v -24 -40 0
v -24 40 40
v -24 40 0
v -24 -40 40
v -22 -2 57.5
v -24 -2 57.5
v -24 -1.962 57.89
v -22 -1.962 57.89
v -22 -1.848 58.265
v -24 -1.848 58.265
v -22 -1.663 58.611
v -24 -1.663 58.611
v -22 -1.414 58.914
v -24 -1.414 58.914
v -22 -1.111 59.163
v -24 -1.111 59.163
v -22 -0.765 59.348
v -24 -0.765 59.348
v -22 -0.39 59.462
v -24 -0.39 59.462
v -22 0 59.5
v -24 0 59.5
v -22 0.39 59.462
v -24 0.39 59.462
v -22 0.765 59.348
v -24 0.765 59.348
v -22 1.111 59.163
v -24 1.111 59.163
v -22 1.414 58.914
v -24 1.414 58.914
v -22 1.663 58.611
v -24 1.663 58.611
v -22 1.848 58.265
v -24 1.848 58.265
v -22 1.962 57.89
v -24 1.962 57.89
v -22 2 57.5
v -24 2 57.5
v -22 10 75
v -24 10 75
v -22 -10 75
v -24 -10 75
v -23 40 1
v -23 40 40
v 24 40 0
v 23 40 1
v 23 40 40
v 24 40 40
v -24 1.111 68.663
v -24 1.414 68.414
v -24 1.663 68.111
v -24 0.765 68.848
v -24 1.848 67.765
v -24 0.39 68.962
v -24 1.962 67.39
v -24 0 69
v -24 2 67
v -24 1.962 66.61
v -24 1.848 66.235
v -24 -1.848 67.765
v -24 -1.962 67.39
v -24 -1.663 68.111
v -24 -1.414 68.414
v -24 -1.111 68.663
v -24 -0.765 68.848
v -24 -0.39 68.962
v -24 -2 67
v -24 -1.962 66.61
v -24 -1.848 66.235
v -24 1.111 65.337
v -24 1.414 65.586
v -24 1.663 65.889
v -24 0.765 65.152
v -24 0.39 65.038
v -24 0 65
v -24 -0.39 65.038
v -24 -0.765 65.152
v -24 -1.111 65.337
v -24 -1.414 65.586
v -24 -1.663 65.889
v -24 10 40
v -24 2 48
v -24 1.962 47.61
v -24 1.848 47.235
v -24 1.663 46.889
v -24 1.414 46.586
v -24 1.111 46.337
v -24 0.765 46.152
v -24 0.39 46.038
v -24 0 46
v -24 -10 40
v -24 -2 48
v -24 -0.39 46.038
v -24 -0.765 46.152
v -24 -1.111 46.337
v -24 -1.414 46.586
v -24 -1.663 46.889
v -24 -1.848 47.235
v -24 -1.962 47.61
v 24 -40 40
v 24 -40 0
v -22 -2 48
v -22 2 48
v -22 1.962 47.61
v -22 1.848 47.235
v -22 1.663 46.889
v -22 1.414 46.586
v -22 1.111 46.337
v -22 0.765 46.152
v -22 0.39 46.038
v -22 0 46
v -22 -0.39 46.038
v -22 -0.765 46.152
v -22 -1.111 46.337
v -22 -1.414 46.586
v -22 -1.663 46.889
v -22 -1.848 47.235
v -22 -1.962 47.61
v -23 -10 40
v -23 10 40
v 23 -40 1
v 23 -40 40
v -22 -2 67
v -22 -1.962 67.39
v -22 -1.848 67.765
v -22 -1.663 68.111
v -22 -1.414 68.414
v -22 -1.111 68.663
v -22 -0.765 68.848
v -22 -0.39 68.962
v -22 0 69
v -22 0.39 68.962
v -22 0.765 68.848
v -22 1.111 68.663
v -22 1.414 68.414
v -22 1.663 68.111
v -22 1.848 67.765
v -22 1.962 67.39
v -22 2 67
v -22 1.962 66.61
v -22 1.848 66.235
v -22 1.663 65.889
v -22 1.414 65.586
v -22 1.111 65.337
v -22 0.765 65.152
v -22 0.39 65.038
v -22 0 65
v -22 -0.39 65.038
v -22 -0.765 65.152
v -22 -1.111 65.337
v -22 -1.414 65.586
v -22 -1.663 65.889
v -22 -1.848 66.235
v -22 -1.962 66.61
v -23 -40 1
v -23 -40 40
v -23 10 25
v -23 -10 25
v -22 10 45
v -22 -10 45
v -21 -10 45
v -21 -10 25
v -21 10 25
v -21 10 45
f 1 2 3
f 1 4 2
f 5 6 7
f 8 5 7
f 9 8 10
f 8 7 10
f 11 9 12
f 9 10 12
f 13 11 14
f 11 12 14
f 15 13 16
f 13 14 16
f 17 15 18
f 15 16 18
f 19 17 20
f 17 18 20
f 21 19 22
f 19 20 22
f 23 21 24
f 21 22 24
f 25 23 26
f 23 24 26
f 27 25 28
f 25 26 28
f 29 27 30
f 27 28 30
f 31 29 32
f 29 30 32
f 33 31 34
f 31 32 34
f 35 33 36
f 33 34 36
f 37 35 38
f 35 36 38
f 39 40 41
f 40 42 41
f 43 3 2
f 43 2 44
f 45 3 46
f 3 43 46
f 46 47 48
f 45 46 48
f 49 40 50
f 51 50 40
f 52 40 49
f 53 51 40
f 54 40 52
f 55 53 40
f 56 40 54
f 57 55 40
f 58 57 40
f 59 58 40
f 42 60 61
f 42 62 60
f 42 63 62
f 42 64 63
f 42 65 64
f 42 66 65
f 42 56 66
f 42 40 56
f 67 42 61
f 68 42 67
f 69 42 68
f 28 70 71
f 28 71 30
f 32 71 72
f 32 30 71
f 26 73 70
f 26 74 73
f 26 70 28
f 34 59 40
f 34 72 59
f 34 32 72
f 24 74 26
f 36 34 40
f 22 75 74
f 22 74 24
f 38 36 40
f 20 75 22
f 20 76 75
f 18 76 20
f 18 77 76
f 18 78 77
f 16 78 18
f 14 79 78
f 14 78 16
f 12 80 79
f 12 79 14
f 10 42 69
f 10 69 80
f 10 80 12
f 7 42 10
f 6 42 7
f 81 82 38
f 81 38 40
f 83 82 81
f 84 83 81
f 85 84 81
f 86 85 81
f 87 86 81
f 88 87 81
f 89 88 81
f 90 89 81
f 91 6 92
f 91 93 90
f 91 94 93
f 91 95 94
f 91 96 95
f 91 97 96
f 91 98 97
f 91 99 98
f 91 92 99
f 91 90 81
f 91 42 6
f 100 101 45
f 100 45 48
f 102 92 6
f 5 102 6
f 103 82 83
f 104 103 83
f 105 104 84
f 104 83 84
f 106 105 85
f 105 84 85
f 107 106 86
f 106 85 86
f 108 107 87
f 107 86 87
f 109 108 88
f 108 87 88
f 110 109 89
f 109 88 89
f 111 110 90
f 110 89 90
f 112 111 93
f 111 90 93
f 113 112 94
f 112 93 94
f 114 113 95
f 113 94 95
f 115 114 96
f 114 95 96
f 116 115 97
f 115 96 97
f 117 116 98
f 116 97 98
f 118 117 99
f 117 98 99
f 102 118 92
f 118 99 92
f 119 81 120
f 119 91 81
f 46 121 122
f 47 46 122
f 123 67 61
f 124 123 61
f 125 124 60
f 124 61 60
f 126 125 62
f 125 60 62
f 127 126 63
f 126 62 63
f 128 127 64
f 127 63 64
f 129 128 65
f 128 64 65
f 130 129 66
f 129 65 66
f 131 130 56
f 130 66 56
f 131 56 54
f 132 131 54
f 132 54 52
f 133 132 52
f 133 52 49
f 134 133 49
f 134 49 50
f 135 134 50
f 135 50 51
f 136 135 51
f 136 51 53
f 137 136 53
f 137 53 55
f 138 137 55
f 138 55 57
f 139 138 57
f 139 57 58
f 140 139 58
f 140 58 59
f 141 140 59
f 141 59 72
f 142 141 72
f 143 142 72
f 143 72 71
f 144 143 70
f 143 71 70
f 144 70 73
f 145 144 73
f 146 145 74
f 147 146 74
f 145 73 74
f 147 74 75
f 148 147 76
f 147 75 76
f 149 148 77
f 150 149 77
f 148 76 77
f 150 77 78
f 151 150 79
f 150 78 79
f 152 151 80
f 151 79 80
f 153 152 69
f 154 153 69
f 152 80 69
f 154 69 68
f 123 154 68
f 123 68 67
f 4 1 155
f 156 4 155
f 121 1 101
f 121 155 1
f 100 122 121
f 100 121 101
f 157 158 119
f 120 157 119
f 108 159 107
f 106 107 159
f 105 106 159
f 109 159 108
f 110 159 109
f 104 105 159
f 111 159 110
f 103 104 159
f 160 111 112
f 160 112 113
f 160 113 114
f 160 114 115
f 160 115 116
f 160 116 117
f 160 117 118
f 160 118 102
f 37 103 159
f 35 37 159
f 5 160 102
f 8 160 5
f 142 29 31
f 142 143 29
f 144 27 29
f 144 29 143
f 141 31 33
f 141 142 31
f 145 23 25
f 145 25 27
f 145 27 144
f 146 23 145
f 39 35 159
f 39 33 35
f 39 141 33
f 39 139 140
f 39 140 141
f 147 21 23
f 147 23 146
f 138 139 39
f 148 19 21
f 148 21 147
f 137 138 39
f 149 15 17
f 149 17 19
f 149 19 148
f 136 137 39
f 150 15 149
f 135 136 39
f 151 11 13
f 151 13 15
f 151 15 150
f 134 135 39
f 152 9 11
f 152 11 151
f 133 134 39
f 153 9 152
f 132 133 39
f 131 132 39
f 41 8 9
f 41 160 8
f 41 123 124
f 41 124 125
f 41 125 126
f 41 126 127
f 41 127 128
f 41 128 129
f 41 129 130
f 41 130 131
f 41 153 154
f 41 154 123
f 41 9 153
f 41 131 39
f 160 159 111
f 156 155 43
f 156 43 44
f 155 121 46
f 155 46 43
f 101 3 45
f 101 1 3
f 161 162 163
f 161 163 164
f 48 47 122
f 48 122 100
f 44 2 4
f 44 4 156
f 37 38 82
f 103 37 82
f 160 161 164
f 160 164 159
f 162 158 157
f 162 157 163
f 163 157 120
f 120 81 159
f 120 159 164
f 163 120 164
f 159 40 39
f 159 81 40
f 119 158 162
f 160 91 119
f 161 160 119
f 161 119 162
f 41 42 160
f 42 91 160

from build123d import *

# Parameters (mm, degrees)
F0_W          = 1
F0_H          = 1
F0_H_2        = 39
F1_DEPTH      = 40
F1_DEPTH_BACK = 40
F2_W          = 2
F2_H          = 15
F2_H_2        = 30
F3_DEPTH      = 10
F3_DEPTH_BACK = 10
F4_R          = 2
F5_DEPTH      = 10


with BuildPart() as f1:
    # F0 (on Front) → F1 (new body, two sides)
    with BuildSketch(Plane.XZ) as f1_sk:
        Polygon((-23, 0), (0, 0), (23, 0), (23, 1), (-23, 1), align=None)
        with Locations((-23.5, 0.5)):
            Rectangle(F0_W, F0_H)
        with Locations((23.5, 0.5)):
            Rectangle(F0_W, F0_H)
        with Locations((-23.5, 20.5)):
            Rectangle(F0_W, F0_H_2)
        with Locations((23.5, 20.5)):
            Rectangle(F0_W, F0_H_2)
    extrude(amount=F1_DEPTH)
    extrude(f1_sk.sketch, amount=-F1_DEPTH_BACK)


with BuildPart() as f3:
    # F2 (on Front) → F3 (new body, two sides)
    with BuildSketch(Plane.XZ) as f3_sk:
        Polygon((-24, 40), (-23, 40), (-21, 40), (-21, 45), (-22, 45), (-24, 45), align=None)
        with Locations((-22, 32.5)):
            Rectangle(F2_W, F2_H)
        with Locations((-23, 60)):
            Rectangle(F2_W, F2_H_2)
    extrude(amount=F3_DEPTH)
    extrude(f3_sk.sketch, amount=-F3_DEPTH_BACK)

    # F4 (on face) → F5 (cut)
    with BuildSketch(Plane(origin=(-24, 0, 0), x_dir=(0, -1, 0), z_dir=(-1, 0, 0))):
        with Locations((0, 67)):
            Circle(F4_R)
        with BuildLine():
            Line((2, 48), (2, 57.5))
            ThreePointArc((2, 57.5), (0, 59.5), (-2, 57.5))
            Line((-2, 57.5), (-2, 48))
            ThreePointArc((-2, 48), (0, 46), (2, 48))
        make_face()
    extrude(amount=-F5_DEPTH, mode=Mode.SUBTRACT)


solid = Compound([f1.part, f3.part])
